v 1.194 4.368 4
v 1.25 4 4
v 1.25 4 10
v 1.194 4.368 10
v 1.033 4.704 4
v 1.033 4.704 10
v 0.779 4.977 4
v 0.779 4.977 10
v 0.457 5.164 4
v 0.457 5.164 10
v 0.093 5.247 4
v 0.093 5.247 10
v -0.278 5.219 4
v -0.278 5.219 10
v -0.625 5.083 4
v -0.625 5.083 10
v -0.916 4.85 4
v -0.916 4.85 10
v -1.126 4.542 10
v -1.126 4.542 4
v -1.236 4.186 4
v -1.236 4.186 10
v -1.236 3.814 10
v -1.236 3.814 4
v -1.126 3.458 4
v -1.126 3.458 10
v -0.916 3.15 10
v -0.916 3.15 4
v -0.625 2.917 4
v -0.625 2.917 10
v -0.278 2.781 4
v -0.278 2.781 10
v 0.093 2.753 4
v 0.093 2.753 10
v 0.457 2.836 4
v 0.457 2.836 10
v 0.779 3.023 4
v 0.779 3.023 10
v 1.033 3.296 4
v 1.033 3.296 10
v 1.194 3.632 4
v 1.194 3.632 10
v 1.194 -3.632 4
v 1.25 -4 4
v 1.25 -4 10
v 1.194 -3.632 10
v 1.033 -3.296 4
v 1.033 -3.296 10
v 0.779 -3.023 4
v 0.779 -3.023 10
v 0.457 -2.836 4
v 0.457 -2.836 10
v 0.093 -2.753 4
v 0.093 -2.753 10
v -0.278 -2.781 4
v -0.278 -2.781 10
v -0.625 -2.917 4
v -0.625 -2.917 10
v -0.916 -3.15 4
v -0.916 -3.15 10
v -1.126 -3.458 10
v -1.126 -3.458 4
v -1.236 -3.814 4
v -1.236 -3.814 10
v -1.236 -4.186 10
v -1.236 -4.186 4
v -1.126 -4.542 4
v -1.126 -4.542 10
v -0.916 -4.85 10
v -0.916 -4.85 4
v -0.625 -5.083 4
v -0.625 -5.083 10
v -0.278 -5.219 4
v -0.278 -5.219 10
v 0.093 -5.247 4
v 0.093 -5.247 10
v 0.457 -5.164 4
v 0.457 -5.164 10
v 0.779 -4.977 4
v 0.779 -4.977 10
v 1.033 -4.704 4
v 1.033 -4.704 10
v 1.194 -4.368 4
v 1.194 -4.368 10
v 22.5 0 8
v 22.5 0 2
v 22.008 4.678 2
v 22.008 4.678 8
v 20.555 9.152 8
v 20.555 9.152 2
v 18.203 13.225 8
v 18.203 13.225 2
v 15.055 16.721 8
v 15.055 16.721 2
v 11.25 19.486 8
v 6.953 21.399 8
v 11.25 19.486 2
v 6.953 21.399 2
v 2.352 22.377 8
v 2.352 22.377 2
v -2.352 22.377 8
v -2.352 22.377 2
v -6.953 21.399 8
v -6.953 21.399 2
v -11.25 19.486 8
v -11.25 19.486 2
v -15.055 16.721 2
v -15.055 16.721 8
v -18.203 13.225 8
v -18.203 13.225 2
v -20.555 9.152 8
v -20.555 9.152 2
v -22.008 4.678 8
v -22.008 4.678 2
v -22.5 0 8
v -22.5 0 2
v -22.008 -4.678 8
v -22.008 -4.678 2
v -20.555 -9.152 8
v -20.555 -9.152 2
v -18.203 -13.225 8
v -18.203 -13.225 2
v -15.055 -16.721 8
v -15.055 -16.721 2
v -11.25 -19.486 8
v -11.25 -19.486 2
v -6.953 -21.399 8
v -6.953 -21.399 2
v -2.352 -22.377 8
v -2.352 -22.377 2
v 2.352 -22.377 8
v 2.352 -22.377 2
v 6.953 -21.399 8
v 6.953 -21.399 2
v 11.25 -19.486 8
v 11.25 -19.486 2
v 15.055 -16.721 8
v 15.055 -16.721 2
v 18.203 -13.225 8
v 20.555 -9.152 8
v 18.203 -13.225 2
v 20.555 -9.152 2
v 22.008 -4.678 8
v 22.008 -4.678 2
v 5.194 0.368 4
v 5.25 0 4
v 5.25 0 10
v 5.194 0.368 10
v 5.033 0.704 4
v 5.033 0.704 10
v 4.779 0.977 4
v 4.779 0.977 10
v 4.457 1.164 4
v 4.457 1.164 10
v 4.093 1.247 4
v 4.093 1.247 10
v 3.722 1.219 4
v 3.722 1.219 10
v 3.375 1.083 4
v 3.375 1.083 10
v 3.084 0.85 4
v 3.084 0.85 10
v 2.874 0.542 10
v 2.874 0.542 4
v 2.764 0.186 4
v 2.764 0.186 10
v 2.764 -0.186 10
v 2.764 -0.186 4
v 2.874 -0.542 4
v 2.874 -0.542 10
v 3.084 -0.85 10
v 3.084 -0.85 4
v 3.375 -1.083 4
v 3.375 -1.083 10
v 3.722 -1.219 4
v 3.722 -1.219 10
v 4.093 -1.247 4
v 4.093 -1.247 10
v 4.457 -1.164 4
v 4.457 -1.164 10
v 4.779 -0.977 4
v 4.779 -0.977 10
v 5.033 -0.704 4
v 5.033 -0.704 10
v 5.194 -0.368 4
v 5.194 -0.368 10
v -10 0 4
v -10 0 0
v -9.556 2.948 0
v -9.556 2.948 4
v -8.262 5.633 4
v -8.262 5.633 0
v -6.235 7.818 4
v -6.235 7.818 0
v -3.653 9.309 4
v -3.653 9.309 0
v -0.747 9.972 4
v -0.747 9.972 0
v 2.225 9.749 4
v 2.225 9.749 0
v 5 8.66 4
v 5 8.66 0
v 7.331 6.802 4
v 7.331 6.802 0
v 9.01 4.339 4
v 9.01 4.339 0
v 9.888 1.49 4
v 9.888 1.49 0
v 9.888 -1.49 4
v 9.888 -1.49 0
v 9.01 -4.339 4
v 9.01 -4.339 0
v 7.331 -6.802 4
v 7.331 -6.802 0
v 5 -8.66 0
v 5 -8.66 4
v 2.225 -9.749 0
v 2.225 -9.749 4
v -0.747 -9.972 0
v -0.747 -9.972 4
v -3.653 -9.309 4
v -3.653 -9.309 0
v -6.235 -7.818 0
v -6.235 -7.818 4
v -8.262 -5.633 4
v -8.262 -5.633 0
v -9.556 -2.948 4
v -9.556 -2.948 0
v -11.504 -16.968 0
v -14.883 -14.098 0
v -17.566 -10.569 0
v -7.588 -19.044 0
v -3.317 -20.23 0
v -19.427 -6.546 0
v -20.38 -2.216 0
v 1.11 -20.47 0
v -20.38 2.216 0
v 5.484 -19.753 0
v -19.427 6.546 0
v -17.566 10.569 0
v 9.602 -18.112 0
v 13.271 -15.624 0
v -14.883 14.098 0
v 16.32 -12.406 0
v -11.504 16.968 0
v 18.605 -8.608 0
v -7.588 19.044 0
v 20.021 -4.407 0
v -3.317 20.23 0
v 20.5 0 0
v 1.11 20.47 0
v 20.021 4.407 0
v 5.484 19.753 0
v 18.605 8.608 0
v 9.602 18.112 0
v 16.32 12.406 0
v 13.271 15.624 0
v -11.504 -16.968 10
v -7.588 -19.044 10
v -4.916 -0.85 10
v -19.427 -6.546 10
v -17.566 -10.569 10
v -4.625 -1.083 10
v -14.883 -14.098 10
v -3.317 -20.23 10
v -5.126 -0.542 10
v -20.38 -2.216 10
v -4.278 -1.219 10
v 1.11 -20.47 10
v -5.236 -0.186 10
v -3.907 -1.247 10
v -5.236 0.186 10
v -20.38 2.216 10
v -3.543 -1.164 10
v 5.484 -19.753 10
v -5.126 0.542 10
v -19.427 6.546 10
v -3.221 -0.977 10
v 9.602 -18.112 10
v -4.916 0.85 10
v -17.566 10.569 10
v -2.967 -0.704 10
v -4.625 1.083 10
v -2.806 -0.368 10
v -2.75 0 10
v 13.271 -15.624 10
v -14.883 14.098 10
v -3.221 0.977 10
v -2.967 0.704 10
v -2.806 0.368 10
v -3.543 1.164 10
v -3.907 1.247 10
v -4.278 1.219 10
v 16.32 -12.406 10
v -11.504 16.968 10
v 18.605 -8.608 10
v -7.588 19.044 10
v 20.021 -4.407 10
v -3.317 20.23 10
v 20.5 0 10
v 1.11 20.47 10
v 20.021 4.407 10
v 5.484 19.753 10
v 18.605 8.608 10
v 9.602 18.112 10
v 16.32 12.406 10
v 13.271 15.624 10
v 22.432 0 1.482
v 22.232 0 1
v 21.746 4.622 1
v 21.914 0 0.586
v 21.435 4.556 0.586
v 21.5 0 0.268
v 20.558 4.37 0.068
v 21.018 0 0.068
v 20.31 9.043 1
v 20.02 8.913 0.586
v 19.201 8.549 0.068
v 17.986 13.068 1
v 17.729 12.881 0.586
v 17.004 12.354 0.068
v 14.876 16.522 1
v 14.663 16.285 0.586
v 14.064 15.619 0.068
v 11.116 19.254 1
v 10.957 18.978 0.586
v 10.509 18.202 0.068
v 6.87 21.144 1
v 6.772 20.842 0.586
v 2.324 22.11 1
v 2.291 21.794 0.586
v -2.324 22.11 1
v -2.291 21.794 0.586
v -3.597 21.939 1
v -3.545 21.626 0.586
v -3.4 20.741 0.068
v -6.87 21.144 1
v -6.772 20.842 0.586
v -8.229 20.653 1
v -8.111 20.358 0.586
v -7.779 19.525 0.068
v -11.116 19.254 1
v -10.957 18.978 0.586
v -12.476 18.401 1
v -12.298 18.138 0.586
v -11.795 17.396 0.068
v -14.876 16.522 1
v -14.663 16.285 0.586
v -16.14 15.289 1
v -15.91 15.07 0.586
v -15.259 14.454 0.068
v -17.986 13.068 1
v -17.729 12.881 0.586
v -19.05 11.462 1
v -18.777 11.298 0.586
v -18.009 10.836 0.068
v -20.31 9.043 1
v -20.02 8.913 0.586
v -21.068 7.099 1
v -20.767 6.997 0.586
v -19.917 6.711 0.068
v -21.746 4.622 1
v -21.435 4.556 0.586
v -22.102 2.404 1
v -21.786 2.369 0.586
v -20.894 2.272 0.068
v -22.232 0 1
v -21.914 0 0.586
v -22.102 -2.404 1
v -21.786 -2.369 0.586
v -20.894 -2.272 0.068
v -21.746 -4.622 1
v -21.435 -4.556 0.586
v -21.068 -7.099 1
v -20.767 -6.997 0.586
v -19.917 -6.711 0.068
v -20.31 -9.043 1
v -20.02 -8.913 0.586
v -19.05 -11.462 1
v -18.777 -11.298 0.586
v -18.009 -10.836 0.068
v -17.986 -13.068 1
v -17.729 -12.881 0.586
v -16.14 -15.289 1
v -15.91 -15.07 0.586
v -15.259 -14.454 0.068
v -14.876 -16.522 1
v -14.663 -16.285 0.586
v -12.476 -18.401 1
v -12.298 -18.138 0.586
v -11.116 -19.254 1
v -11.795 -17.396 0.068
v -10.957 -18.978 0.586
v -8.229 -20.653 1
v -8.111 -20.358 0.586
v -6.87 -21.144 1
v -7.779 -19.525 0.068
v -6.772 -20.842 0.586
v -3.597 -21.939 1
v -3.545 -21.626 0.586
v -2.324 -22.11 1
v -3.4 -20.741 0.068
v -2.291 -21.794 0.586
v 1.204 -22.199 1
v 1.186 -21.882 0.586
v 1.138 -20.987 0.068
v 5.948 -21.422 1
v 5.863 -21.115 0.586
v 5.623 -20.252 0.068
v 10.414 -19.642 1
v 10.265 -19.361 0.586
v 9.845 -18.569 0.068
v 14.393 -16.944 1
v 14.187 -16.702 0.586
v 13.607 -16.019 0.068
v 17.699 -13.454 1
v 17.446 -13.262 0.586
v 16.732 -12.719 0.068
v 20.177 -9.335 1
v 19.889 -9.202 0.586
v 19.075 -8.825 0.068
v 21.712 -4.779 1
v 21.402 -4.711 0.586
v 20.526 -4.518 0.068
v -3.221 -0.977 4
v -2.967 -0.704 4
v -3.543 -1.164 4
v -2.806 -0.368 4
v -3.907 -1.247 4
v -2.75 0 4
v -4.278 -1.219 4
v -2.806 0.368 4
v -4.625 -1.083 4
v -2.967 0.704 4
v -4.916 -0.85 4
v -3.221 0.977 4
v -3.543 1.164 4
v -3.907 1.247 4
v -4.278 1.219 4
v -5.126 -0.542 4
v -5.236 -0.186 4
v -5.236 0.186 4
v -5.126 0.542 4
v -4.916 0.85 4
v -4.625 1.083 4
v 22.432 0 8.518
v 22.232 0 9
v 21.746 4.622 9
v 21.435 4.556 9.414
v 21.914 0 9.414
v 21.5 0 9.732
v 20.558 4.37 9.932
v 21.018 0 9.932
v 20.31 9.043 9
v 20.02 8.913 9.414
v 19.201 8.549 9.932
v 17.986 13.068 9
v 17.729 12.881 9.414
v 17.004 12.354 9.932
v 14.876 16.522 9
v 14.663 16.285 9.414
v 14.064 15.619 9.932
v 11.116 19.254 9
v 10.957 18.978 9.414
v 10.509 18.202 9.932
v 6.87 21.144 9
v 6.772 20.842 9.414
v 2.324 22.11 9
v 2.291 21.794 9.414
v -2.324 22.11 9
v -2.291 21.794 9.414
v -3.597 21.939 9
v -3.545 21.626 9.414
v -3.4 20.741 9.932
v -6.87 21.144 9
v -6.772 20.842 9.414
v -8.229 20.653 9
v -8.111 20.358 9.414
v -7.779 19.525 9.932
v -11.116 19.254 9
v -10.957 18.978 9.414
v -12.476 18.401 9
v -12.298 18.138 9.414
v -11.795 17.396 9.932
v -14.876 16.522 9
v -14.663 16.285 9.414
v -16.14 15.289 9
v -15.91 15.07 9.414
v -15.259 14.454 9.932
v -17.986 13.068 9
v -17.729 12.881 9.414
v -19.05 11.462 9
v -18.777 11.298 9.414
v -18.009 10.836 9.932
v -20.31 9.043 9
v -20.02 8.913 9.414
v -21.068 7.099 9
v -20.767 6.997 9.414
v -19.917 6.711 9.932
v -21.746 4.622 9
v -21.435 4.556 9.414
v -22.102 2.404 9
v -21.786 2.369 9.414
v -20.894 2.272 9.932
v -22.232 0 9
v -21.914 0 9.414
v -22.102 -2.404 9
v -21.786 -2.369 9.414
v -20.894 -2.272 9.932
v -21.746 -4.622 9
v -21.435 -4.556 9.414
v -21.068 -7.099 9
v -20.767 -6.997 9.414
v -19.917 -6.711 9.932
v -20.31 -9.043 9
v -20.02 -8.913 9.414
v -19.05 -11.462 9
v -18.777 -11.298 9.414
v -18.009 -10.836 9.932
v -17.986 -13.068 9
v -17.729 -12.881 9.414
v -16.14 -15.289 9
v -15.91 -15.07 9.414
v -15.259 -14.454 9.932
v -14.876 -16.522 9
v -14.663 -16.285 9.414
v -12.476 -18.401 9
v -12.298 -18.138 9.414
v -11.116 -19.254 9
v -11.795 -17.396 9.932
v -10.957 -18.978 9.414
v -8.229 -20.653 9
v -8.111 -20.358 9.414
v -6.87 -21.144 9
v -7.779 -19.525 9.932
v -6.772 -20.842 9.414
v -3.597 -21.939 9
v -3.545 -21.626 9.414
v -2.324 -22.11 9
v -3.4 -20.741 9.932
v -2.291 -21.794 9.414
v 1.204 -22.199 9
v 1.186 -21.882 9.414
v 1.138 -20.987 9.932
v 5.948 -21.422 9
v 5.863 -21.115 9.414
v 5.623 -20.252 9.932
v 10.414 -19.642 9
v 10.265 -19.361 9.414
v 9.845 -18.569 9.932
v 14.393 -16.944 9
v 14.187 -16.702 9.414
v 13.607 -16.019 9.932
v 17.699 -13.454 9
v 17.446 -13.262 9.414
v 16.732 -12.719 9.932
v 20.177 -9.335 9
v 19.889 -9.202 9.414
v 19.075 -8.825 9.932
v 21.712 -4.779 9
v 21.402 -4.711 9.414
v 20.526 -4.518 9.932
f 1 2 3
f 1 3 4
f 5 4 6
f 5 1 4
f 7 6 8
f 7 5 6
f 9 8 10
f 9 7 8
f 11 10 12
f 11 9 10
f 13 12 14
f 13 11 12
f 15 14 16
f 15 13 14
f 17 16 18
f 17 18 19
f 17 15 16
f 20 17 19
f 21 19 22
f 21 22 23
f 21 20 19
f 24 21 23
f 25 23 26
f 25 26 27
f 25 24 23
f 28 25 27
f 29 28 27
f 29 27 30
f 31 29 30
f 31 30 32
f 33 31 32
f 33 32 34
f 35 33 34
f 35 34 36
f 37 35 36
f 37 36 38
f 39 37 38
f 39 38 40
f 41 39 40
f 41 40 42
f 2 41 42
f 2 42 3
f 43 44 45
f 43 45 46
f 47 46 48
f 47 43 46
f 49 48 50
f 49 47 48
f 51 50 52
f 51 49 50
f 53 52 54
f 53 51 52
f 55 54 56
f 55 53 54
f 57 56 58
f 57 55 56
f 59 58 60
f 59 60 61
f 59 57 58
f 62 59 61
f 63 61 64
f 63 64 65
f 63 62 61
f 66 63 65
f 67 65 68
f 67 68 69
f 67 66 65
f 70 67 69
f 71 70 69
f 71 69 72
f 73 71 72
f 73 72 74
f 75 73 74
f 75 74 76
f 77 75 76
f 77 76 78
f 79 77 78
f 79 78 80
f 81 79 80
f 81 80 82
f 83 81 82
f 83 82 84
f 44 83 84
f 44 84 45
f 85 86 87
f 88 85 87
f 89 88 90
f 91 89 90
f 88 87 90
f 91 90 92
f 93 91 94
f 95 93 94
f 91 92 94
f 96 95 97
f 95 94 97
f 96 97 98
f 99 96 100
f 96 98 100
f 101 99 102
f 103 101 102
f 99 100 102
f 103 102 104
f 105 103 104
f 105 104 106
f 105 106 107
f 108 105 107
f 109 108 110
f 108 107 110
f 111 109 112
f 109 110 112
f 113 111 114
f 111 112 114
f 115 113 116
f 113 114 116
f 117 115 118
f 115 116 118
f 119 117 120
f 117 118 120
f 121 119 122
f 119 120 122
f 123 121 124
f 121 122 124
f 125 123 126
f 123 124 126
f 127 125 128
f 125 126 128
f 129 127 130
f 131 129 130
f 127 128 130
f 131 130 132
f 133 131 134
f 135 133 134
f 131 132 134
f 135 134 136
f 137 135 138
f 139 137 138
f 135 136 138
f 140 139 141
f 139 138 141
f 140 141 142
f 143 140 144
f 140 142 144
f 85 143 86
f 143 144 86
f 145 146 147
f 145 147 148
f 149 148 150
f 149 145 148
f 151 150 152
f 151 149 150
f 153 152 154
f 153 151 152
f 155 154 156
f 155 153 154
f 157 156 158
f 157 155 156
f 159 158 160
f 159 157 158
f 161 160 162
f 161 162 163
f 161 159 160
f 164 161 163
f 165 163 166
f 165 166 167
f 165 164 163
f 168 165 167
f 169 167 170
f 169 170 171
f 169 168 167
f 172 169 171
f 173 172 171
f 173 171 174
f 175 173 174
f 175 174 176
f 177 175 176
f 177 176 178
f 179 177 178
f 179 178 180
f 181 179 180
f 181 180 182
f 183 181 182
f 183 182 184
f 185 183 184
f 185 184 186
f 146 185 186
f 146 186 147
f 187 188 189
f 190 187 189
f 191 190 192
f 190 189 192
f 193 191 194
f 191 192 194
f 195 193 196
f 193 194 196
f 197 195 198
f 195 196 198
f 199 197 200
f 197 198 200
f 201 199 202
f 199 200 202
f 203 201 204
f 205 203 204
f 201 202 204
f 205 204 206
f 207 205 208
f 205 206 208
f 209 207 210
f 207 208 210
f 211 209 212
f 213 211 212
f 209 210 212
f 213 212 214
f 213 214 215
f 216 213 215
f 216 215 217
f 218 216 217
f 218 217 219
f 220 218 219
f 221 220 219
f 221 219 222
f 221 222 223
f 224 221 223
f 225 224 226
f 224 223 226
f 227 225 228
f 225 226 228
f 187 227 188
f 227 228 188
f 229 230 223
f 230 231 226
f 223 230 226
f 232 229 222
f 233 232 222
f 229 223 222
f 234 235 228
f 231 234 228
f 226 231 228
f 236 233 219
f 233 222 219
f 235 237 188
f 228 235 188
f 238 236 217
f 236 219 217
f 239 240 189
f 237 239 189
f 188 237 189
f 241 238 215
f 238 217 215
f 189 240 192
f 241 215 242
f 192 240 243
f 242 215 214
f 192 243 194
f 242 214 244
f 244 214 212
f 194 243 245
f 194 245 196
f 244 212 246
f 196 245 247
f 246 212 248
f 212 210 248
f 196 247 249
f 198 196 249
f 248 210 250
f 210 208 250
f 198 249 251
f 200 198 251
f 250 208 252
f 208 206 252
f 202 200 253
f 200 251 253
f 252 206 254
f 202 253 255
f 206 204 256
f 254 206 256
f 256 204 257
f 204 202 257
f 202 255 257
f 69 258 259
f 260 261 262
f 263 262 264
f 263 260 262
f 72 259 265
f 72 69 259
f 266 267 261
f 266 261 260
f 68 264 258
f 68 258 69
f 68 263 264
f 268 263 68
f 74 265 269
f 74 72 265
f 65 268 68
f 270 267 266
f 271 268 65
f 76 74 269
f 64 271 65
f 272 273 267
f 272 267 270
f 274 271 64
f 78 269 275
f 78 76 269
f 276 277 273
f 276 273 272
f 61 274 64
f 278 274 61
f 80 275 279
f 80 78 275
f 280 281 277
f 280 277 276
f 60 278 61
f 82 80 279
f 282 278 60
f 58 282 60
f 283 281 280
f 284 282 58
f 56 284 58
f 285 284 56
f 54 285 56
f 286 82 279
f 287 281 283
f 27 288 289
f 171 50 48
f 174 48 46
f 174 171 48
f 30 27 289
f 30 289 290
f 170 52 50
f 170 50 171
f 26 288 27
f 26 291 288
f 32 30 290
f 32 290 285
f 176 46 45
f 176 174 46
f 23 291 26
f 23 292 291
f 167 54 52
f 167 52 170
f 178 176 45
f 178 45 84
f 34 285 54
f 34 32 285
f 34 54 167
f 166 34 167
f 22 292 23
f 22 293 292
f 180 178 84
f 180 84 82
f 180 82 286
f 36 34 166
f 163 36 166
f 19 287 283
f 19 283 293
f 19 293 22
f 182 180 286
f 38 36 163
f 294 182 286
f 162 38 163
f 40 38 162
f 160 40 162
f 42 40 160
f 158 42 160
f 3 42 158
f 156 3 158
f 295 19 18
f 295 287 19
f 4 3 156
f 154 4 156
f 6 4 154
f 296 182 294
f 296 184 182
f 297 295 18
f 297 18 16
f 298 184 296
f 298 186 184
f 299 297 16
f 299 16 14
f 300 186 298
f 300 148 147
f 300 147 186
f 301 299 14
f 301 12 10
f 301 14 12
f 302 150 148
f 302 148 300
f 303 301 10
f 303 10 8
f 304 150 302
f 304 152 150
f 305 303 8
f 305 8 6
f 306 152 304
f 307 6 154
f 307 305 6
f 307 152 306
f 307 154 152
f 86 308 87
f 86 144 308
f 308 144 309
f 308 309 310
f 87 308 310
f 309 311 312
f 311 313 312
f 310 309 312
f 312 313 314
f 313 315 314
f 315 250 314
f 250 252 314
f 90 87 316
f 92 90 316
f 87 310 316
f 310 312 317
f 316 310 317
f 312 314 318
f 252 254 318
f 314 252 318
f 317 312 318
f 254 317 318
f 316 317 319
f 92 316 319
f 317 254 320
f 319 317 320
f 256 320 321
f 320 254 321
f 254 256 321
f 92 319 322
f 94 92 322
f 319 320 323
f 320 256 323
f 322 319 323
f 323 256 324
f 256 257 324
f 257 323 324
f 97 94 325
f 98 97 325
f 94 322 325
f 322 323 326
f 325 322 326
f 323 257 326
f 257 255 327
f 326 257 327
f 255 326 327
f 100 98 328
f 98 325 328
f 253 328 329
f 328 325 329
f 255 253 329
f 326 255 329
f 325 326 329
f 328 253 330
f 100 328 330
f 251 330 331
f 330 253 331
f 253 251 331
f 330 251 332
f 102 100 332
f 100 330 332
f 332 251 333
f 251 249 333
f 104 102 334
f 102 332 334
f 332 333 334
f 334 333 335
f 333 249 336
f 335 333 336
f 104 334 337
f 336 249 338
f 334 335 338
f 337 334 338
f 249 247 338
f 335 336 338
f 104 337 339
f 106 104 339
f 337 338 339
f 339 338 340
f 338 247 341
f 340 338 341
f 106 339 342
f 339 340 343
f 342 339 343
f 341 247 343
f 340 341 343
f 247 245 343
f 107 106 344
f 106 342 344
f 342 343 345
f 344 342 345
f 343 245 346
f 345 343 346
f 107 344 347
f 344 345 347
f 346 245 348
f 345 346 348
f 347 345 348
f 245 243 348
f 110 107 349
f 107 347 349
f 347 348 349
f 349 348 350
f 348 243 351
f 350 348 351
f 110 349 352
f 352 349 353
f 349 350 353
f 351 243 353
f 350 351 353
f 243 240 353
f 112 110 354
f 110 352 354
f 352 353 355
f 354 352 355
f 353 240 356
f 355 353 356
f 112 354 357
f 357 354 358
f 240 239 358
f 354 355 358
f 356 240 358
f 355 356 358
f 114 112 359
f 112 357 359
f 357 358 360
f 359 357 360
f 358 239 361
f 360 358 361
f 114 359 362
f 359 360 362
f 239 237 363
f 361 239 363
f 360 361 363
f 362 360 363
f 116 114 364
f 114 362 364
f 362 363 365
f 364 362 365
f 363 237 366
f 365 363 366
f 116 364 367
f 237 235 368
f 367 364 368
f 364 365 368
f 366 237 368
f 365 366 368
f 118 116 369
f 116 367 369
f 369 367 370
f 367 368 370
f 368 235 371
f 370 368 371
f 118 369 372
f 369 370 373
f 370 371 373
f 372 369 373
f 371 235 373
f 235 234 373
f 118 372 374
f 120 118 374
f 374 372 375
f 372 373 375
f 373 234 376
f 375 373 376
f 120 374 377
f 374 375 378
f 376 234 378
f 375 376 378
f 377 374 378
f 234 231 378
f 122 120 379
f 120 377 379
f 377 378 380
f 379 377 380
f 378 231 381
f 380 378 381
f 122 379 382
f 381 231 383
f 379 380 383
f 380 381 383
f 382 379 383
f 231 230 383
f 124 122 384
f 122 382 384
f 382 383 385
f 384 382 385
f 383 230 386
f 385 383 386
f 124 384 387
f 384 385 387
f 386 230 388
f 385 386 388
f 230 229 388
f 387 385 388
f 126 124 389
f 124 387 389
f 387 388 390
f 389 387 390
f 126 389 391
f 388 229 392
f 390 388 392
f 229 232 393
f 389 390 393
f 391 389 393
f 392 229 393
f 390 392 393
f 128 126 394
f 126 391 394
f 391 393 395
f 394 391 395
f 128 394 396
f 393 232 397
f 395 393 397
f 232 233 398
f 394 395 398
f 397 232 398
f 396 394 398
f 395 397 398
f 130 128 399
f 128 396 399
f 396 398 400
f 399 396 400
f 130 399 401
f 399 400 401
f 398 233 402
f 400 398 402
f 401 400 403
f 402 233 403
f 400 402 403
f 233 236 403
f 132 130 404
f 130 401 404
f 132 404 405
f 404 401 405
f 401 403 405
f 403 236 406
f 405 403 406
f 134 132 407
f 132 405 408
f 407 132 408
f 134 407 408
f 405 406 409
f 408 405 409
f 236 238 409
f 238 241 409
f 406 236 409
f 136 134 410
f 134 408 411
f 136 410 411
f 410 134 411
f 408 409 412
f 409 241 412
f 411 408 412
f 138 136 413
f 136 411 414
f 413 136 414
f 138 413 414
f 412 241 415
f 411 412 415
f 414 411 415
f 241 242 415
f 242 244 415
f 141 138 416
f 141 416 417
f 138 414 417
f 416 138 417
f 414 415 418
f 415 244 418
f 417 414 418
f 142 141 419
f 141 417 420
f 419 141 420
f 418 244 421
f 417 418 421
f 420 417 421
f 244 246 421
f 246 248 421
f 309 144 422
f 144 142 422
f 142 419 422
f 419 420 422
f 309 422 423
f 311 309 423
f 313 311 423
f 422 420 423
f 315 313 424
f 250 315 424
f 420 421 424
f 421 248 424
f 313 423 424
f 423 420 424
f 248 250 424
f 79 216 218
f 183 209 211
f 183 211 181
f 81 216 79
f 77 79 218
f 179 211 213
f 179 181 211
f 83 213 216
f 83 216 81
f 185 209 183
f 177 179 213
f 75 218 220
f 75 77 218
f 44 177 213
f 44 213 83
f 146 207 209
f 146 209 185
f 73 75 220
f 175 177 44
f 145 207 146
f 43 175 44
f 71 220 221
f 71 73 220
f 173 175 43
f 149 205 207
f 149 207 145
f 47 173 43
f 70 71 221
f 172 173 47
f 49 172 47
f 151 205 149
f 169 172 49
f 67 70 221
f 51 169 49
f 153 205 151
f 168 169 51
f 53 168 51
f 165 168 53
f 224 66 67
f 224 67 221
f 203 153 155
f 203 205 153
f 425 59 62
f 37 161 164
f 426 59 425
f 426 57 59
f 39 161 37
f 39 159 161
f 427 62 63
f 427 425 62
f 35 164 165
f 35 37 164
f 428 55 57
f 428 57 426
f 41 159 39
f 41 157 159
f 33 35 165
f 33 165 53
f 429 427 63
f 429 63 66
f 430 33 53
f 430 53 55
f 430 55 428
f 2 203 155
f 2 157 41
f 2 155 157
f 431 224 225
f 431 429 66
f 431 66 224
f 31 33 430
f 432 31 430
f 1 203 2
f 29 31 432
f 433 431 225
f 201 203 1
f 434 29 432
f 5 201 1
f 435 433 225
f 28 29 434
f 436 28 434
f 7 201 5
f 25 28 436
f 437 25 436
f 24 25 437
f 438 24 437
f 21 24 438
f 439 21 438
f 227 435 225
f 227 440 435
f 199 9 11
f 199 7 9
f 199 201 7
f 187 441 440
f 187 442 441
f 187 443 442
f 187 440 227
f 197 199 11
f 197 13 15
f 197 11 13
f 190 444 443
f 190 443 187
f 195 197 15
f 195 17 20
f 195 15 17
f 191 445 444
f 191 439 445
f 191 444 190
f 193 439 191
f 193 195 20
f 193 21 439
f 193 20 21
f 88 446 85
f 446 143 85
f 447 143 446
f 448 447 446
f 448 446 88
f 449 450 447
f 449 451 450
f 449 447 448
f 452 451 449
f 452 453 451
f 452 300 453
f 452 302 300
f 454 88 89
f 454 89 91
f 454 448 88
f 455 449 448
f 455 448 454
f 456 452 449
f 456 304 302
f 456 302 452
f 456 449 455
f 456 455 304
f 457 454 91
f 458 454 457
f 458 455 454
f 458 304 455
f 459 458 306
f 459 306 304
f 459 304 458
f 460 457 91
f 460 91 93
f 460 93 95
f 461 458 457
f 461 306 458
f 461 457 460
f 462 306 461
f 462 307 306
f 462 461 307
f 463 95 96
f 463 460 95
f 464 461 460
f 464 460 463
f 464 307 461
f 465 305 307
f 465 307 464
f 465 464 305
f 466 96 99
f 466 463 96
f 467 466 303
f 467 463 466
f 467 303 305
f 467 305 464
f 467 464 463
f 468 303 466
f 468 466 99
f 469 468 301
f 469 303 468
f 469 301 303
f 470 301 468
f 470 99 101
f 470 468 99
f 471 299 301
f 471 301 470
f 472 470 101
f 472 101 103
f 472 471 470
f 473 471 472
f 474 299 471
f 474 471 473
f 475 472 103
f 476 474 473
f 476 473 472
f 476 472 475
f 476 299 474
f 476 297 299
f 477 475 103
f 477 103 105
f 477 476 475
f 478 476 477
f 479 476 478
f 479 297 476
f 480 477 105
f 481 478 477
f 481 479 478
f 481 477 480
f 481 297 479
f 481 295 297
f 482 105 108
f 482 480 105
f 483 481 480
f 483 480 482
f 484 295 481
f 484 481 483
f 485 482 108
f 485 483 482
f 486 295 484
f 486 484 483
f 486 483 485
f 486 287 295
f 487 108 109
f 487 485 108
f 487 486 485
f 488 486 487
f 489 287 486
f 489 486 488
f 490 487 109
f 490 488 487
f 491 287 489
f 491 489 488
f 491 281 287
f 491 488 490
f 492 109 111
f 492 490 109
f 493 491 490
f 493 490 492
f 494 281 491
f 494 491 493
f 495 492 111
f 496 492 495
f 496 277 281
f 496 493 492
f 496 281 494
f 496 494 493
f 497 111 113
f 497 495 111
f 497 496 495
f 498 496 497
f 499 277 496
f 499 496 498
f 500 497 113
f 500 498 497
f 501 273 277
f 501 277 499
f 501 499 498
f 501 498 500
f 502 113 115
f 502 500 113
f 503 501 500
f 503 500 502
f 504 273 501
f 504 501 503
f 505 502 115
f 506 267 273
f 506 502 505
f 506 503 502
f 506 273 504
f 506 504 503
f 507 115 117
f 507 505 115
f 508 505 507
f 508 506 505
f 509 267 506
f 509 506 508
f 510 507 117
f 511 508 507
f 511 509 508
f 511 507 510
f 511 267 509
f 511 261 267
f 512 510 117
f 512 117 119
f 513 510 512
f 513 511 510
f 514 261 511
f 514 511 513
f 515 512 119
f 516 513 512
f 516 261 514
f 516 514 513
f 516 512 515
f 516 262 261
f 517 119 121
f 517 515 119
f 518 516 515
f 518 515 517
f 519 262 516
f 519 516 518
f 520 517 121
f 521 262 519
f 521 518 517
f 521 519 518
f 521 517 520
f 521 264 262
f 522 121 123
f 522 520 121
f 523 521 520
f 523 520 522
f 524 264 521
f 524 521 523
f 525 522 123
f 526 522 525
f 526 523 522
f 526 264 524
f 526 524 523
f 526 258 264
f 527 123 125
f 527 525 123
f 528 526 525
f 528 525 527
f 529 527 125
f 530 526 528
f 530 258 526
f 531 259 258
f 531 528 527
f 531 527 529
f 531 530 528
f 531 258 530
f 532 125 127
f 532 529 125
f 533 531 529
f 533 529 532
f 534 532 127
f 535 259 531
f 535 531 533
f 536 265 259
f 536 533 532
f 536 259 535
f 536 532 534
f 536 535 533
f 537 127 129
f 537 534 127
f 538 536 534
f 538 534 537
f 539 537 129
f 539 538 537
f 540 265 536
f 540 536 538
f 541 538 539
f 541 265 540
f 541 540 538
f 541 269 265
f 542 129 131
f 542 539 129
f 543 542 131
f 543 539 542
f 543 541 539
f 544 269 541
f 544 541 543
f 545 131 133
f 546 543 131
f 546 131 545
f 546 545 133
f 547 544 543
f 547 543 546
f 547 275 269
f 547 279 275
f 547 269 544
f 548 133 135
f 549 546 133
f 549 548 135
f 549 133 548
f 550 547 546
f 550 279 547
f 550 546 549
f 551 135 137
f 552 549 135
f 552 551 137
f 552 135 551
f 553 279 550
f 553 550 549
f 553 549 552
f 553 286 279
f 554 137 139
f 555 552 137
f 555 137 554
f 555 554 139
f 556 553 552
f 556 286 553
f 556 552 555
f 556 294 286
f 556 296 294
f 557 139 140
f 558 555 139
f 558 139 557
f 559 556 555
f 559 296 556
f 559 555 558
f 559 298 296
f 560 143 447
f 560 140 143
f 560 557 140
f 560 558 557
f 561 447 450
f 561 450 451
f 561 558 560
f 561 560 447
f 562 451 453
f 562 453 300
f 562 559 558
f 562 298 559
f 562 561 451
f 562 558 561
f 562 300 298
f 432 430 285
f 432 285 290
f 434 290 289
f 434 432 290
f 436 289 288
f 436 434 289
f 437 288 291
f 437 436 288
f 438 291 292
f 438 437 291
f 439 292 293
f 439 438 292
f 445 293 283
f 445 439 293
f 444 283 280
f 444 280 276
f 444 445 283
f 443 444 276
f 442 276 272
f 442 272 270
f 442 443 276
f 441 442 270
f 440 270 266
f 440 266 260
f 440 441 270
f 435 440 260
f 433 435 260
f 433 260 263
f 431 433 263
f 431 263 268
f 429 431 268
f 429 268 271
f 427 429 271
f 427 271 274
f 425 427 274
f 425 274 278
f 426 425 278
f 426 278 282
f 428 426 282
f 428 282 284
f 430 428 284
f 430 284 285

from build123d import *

# Parameters (mm, degrees)
SKETCH2_R           = 22.5
SKETCH2_R_2         = 1.25
BOSS_EXTRUDE1_DEPTH = 10
SKETCH3_R           = 10
CUT_EXTRUDE1_DEPTH  = 4
FILLET1_R           = 2


with BuildPart() as part:
    # Sketch2 → Boss-Extrude1 (new body)
    with BuildSketch(Plane.XY):
        Circle(SKETCH2_R)
        with Locations((4, 0)):
            Circle(SKETCH2_R_2, mode=Mode.SUBTRACT)
        with Locations((0, 4)):
            Circle(SKETCH2_R_2, mode=Mode.SUBTRACT)
        with Locations((-4, 0)):
            Circle(SKETCH2_R_2, mode=Mode.SUBTRACT)
        with Locations((0, -4)):
            Circle(SKETCH2_R_2, mode=Mode.SUBTRACT)
    extrude(amount=BOSS_EXTRUDE1_DEPTH)

    # Sketch3 → Cut-Extrude1 (cut)
    with BuildSketch(Plane(origin=(0, 0, 0), x_dir=(-1, 0, 0), z_dir=(0, 0, -1))):
        Circle(SKETCH3_R)
    extrude(amount=-CUT_EXTRUDE1_DEPTH, mode=Mode.SUBTRACT)

    # Fillet1
    fillet1_edges = [part.edges().sort_by_distance(p)[0] for p in [
        (-22.5, 0, 0),
        (-22.5, 0, 10),
    ]]
    fillet(fillet1_edges, radius=FILLET1_R)


solid = part.part
